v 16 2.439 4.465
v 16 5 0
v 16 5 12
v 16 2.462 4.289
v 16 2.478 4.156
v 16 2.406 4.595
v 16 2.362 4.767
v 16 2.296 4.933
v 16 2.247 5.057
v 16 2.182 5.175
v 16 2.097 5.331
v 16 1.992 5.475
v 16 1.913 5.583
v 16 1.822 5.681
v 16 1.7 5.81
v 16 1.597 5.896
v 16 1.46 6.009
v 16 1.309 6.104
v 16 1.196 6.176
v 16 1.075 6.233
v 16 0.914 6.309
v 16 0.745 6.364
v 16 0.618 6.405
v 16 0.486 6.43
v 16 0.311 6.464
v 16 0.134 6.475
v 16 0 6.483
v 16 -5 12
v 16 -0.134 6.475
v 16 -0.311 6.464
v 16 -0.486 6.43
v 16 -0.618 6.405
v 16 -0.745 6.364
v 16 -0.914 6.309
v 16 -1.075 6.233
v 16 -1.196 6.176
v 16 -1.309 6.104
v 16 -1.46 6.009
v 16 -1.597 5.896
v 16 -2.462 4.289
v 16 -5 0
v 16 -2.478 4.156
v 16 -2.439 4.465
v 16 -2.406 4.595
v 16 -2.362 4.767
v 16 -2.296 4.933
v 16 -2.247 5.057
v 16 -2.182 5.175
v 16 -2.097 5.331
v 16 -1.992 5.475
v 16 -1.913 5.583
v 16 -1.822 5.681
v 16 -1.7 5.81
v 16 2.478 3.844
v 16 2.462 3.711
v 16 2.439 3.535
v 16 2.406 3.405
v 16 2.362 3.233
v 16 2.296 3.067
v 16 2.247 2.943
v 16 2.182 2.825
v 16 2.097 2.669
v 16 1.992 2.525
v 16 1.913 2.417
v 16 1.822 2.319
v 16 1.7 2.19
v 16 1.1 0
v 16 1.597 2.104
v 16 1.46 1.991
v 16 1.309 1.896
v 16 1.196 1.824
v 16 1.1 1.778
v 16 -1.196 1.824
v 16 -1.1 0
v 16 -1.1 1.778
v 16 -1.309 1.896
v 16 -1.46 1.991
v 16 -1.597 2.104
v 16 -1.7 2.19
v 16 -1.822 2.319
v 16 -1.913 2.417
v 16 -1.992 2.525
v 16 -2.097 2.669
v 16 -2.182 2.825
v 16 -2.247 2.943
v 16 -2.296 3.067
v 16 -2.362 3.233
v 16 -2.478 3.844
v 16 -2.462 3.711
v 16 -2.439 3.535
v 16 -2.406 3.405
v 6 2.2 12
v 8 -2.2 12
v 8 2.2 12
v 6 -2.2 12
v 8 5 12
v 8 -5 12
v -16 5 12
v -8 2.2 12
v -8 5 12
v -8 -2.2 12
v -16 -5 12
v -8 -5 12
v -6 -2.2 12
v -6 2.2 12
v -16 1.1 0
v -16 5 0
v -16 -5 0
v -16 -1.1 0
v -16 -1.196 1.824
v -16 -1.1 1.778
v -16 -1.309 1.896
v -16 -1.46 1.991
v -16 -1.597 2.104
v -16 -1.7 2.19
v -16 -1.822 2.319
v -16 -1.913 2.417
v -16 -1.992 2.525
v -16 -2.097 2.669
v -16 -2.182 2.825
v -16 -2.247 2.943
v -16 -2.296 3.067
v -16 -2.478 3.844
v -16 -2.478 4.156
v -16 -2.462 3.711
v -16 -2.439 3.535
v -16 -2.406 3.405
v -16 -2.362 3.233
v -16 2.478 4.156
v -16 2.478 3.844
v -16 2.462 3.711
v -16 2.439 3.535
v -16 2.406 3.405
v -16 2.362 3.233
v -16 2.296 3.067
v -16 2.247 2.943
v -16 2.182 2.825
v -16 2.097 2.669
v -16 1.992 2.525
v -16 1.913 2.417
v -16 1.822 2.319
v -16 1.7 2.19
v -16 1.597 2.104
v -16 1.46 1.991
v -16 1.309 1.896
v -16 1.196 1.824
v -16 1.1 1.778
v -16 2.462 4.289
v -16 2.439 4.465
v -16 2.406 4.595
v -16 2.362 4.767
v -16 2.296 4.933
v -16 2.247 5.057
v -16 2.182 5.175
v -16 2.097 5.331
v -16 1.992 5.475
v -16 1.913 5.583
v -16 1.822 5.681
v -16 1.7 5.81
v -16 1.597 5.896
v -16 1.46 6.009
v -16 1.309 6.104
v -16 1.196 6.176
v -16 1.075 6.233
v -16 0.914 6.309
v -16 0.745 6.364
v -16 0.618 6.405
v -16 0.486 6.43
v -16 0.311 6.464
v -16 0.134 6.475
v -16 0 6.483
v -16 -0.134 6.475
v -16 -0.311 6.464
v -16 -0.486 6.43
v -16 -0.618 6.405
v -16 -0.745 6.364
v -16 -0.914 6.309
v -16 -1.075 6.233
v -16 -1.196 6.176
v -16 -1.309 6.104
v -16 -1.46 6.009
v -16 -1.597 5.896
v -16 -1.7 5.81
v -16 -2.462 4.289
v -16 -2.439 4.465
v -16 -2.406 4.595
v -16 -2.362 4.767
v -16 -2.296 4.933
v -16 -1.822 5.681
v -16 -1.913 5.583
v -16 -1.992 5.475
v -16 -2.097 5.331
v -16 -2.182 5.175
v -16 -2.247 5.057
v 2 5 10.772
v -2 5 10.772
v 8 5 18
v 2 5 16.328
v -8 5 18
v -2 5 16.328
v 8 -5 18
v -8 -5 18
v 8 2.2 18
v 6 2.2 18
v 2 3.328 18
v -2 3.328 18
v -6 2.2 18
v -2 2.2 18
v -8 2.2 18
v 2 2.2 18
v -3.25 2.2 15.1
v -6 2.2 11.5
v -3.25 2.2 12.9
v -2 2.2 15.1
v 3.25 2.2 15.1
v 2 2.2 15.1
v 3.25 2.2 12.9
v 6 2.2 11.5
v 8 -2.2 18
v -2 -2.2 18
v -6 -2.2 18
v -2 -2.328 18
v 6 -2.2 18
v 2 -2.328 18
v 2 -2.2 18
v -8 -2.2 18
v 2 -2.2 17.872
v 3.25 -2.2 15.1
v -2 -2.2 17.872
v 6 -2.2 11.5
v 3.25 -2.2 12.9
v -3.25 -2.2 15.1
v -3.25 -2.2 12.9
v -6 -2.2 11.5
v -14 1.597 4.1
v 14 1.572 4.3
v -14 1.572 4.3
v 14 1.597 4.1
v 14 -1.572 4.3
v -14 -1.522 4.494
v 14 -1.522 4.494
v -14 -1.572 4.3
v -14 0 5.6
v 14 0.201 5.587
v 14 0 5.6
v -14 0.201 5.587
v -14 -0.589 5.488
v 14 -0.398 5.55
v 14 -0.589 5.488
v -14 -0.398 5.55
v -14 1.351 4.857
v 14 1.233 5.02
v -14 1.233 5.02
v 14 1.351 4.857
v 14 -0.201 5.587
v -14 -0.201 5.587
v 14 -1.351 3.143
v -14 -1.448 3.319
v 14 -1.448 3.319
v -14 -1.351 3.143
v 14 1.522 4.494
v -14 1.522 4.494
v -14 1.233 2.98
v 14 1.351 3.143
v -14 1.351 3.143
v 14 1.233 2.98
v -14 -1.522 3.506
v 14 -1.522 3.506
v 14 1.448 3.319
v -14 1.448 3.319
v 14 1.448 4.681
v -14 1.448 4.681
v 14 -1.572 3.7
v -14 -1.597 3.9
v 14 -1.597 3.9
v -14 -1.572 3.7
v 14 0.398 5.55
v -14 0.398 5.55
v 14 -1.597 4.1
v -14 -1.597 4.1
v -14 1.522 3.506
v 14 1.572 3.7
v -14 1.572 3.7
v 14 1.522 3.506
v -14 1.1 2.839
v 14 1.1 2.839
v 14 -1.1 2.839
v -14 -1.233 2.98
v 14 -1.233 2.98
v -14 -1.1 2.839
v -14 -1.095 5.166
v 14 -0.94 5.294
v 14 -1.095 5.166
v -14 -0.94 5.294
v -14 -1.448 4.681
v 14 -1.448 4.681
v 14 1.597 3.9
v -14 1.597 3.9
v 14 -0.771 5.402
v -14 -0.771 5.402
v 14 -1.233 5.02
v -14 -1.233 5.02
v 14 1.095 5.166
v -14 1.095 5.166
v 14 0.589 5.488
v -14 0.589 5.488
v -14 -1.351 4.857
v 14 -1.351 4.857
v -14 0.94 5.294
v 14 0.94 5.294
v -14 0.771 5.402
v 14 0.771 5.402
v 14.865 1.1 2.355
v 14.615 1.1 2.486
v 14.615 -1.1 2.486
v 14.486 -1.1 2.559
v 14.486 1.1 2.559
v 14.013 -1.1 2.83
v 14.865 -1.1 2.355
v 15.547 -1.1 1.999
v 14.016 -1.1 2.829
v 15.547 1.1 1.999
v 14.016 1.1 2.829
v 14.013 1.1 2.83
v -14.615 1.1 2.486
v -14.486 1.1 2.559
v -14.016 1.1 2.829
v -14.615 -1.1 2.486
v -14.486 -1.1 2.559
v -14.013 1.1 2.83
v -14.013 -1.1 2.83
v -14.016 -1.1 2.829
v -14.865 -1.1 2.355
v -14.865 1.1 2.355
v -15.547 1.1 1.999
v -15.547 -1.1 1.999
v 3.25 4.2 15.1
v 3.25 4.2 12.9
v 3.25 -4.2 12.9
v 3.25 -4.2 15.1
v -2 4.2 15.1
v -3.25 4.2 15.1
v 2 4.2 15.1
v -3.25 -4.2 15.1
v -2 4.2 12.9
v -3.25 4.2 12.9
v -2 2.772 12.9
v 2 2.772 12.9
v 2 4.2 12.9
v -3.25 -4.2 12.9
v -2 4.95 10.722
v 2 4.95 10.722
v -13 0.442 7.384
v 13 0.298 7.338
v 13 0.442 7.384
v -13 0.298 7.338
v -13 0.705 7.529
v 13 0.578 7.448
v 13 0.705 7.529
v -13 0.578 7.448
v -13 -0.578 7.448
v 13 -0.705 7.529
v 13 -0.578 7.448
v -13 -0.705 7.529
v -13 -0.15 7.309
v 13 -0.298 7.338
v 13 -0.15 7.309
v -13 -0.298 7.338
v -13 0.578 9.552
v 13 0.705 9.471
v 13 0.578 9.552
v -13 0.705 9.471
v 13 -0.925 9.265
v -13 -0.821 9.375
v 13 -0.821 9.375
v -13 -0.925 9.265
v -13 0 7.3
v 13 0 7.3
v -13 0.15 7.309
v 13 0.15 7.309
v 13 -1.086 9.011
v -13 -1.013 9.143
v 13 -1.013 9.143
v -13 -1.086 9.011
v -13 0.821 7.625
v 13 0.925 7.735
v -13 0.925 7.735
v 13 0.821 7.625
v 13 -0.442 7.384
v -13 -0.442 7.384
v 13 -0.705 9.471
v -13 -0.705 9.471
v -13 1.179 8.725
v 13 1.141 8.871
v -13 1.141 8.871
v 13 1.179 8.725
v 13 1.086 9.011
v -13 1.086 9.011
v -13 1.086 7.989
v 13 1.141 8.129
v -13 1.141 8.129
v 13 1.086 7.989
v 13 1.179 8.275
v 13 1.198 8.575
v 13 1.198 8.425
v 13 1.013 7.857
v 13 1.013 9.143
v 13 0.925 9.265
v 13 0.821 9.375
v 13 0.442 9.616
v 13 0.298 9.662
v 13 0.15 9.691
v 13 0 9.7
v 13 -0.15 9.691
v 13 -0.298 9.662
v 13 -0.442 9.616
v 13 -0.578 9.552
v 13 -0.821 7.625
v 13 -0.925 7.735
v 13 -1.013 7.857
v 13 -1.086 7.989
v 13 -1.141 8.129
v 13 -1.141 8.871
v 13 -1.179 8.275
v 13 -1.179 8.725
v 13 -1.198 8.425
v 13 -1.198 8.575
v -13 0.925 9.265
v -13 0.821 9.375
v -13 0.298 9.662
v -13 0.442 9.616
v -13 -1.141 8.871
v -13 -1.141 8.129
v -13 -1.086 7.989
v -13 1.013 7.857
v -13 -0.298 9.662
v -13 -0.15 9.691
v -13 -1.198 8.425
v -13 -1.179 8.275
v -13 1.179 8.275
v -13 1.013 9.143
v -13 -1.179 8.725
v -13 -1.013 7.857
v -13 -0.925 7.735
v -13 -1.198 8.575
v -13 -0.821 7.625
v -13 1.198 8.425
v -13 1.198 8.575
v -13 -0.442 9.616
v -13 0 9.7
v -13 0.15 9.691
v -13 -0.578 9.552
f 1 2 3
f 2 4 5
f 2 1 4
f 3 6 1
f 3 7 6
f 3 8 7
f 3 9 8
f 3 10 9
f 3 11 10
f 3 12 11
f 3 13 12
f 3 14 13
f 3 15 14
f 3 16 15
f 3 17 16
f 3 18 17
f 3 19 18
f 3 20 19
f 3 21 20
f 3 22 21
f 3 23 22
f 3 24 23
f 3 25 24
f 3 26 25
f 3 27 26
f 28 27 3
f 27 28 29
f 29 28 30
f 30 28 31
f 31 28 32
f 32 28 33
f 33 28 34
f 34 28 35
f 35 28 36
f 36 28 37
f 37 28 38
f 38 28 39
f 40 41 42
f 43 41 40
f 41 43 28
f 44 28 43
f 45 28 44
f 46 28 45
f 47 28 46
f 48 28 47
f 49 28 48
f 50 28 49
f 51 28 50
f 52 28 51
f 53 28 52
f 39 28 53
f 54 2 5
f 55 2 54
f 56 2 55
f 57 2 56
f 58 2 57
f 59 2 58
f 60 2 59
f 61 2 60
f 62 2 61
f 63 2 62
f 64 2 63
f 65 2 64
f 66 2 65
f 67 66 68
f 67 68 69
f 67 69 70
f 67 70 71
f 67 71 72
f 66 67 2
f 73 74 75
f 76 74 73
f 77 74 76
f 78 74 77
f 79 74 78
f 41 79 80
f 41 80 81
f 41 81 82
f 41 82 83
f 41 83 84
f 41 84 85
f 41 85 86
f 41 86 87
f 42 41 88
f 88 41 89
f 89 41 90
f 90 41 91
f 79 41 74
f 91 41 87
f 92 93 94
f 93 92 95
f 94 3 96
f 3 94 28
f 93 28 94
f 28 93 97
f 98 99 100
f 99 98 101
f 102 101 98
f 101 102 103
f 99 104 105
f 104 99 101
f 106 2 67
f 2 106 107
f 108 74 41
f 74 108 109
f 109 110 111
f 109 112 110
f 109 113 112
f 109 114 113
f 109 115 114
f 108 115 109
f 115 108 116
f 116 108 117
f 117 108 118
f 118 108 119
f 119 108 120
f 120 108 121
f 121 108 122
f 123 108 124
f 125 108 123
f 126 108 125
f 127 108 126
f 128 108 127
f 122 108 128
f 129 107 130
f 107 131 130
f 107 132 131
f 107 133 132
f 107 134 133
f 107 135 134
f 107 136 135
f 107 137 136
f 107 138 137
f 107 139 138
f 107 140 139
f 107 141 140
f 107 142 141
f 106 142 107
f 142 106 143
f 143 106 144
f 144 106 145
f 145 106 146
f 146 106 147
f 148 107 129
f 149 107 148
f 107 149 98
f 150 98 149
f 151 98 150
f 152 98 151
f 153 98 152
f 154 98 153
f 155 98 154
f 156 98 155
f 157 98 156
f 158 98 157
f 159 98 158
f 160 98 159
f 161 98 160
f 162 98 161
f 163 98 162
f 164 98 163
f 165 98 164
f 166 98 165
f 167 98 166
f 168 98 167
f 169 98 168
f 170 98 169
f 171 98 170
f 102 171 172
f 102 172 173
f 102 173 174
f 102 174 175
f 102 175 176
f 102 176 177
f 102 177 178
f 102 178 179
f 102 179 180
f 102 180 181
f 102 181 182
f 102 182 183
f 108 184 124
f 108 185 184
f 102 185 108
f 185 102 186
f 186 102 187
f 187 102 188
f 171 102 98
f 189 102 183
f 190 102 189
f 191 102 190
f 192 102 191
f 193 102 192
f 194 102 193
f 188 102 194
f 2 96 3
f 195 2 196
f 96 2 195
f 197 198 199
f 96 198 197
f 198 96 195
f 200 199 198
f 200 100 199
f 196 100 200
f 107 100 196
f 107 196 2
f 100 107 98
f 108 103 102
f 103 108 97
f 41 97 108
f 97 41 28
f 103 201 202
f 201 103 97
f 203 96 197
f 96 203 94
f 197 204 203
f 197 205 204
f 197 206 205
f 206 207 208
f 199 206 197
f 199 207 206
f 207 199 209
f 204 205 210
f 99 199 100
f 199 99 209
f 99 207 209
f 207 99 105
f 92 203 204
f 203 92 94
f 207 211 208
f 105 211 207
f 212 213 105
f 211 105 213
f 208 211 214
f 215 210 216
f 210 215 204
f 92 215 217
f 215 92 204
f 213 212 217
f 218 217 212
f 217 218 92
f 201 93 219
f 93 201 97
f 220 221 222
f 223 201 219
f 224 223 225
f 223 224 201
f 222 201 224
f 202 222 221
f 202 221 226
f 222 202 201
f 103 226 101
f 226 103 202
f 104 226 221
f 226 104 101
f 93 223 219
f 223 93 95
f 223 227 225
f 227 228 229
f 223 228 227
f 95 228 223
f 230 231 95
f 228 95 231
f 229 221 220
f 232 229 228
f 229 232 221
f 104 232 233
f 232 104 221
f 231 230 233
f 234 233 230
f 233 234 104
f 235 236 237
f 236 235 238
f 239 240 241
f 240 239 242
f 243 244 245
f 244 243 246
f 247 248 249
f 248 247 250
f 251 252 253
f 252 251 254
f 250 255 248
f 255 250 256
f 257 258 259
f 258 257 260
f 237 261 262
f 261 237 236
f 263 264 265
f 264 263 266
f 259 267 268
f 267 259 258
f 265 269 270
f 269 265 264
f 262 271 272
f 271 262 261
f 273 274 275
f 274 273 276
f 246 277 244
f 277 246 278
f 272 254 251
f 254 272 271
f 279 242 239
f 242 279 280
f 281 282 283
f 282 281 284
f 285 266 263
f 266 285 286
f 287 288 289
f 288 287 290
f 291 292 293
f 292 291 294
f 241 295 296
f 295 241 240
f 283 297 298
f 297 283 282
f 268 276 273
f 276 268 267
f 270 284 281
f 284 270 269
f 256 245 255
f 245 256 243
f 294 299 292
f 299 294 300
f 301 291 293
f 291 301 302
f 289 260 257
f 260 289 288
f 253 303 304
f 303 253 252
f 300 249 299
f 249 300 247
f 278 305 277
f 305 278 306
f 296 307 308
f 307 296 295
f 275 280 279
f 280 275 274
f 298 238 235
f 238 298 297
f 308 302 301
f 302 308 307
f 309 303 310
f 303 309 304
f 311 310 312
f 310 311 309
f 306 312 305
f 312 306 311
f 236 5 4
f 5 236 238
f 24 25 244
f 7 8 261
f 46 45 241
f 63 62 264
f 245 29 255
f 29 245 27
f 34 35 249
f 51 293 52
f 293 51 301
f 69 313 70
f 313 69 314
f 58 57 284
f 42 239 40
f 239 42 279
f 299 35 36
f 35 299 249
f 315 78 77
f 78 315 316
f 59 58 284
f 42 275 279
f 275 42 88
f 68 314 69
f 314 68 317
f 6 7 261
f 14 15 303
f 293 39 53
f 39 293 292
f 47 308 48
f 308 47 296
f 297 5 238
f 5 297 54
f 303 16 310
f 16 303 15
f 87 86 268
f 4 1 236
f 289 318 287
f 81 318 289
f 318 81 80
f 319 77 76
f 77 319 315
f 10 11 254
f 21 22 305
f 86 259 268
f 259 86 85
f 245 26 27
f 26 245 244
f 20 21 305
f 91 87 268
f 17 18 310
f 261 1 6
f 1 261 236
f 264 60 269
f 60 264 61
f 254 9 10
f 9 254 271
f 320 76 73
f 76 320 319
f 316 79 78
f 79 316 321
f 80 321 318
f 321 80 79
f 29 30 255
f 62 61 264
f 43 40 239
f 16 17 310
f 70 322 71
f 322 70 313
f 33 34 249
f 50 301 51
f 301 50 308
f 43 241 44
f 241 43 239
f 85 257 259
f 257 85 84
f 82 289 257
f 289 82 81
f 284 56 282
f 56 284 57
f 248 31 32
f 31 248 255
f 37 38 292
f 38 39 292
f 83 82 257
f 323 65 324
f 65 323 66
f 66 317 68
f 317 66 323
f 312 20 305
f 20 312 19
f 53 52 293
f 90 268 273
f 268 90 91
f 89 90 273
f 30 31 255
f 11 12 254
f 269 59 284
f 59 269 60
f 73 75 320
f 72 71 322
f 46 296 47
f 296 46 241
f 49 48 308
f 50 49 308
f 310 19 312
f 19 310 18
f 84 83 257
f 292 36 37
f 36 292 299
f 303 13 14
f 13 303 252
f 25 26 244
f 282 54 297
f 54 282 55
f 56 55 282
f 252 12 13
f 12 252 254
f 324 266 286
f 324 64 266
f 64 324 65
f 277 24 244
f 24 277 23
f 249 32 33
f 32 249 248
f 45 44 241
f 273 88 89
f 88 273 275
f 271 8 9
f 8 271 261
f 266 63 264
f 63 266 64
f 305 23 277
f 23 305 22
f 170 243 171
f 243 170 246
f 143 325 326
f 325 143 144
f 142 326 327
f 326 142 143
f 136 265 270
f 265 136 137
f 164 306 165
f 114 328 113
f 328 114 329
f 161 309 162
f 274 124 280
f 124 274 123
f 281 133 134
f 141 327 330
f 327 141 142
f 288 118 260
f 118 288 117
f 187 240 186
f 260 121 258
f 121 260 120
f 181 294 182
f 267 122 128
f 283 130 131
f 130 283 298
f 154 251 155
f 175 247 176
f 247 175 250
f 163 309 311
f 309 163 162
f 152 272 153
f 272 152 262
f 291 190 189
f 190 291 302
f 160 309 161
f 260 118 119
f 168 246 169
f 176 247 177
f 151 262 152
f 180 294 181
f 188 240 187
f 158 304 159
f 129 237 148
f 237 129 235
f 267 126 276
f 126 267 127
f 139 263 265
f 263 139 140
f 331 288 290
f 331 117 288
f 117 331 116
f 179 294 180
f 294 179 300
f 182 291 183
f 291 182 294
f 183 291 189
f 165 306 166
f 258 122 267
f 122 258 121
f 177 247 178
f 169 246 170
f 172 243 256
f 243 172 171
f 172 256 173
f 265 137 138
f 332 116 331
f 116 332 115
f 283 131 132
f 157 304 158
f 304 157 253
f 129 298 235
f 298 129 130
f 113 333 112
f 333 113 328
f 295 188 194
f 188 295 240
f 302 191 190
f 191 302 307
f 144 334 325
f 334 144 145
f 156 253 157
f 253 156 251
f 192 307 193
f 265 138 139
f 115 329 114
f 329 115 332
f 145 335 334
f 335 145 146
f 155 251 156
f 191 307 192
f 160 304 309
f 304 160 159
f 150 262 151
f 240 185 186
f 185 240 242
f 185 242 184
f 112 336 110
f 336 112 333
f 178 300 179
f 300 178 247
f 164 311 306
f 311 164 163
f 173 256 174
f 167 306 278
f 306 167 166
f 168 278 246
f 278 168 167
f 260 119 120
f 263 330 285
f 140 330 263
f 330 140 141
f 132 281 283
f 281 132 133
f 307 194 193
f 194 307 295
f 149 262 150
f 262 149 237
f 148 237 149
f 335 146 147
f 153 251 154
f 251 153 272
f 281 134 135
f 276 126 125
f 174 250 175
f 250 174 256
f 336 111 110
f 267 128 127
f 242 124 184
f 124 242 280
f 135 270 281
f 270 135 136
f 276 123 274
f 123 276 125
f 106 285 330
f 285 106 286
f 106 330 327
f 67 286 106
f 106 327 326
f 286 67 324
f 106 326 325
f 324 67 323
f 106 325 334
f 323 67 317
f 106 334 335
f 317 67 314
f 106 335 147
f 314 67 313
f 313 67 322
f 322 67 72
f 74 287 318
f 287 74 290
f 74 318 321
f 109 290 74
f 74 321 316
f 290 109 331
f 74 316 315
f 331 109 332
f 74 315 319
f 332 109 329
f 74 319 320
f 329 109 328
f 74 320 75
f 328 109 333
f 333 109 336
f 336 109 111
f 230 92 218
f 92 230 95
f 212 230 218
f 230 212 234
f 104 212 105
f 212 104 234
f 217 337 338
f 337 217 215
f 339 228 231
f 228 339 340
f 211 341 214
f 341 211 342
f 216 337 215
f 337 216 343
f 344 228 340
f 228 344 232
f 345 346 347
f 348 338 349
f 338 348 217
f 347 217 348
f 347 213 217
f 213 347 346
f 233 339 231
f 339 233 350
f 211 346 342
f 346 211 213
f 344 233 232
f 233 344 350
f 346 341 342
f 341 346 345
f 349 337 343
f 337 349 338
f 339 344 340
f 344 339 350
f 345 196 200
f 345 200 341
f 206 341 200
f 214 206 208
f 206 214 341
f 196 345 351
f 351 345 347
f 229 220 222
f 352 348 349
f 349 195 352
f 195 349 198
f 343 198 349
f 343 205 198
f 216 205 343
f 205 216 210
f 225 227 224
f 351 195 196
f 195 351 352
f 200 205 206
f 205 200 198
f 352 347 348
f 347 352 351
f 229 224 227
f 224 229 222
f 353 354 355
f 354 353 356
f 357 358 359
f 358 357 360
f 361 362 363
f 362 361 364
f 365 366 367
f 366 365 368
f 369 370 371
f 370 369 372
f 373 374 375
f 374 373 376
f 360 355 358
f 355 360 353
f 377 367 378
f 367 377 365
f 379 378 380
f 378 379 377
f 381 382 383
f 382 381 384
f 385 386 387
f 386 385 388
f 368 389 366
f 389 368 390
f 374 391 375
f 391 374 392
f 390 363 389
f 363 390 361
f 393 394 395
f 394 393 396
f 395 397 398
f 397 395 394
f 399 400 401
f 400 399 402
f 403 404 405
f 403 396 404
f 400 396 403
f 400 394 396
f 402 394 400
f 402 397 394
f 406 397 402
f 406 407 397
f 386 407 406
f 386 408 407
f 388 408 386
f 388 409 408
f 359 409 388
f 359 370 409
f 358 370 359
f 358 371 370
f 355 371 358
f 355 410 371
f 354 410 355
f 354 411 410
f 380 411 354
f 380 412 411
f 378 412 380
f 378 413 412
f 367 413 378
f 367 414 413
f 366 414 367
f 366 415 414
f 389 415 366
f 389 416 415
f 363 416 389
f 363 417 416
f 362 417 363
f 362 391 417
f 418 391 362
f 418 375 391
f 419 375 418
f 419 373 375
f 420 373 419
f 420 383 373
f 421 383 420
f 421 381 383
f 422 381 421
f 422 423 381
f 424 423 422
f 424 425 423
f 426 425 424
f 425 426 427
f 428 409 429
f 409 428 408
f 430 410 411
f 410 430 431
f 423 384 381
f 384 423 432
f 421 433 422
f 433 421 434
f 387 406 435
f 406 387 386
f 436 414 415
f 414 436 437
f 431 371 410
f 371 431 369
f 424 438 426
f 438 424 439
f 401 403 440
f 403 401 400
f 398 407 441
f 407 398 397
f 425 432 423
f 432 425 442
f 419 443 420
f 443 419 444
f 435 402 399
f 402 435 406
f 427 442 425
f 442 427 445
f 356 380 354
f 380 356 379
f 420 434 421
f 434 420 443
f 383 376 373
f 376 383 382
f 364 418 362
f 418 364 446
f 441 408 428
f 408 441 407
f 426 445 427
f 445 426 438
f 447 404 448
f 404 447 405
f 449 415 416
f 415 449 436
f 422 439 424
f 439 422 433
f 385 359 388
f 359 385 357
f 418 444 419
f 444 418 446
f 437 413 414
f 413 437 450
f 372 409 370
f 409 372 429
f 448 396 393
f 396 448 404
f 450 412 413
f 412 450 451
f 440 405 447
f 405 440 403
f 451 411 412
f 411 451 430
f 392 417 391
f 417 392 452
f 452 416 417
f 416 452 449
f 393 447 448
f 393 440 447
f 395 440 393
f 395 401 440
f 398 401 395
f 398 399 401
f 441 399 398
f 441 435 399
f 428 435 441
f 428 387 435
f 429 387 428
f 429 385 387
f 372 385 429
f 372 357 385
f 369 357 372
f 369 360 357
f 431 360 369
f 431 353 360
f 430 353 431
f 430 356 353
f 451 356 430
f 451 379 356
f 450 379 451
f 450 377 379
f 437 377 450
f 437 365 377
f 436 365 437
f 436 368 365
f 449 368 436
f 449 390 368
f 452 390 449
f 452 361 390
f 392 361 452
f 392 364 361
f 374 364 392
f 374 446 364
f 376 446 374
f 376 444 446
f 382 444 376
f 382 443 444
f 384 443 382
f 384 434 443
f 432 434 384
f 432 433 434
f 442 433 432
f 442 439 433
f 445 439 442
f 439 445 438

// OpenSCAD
// ====================================================================
// Alpine Cable Glider Sled Runner (Option A: Barb-Lock Snap Socket)
// 
// Features:
// - Top Glider Channel: Smooth 45-degree trumpet funnels glide snag-free on cable line.
// - Bottom Barb-Lock Socket: Internal locking shoulders receive the 
//   wedge arrow-head barb of C-Hanger Arm (03).
// - ZERO TINY PEGS! ZERO LOOSE PINS! ZERO SCREWS!
// ====================================================================

$fn = 50;

chassis_l    = 32.0; // Overall glider length (mm)
chassis_w    = 10.0; // Overall glider width (mm)
chassis_h    = 12.0; // Chassis height (mm)
cable_bore_d = 3.2;  // Inner smooth cable channel diameter
clevis_gap   = 4.4;  // Fits 4.0mm hanger arm tab
clevis_ear_h = 6.0;  // Lower clevis ear height


module trolley_carriage_glider_print() {
    difference() {
        union() {
            // Main chassis block (flat on bed at Z = 0)
            translate([0, 0, chassis_h / 2])
                cube([chassis_l, chassis_w, chassis_h], center = true);
            
            // Lower hanger clevis ears
            translate([0, (clevis_gap + (chassis_w - clevis_gap)/2) / 2, chassis_h + clevis_ear_h / 2])
                cube([16.0, (chassis_w - clevis_gap)/2, clevis_ear_h], center = true);
            translate([0, -(clevis_gap + (chassis_w - clevis_gap)/2) / 2, chassis_h + clevis_ear_h / 2])
                cube([16.0, (chassis_w - clevis_gap)/2, clevis_ear_h], center = true);
        }

        // 1. Longitudinal smooth cable tunnel bore
        translate([0, 0, 4.0])
            rotate([0, 90, 0])
                cylinder(d = cable_bore_d, h = chassis_l + 4, center = true);

        // 2. Flared trumpet entry funnels at both ends (+X and -X)
        translate([chassis_l / 2 - 2, 0, 4.0])
            rotate([0, 90, 0])
                cylinder(d1 = cable_bore_d, d2 = 8.5, h = 6.0);
        translate([-chassis_l / 2 + 2, 0, 4.0])
            rotate([0, -90, 0])
                cylinder(d1 = cable_bore_d, d2 = 8.5, h = 6.0);

        // 3. Top snap-entry slot (2.2mm top opening)
        translate([0, 0, 2.0])
            cube([chassis_l + 4, 2.2, 5.0], center = true);

        // --- INTERNAL BARB-LOCK SHOULDERS (RECEIVES HANGER ARM BARB) ---
        // 4. Central receiving slot for 4.0mm C-Hanger Arm top tab
        translate([0, 0, chassis_h + clevis_ear_h / 2 + 0.5])
            cube([12.0, clevis_gap, clevis_ear_h + 2], center = true);

        // 5. Internal Barb-Lock Shoulders (6.5mm width inside slot)
        translate([0, 0, chassis_h + 2.0])
            cube([6.5, clevis_gap + 4.0, 2.2], center = true);

        // 6. 45-degree self-guiding lead-in chamfer mouth at entry
        translate([0, 0, chassis_h + clevis_ear_h + 0.5])
            rotate([45, 0, 0])
                cube([4.0, 4.0, 18.0], center = true);

        // Optional haul-line tie-off slots (for motorized pull string)
        translate([6, 0, 8.5])
            rotate([0, 90, 0])
                cylinder(d = 2.4, h = chassis_w + 4, center = true);
        translate([-6, 0, 8.5])
            rotate([0, 90, 0])
                cylinder(d = 2.4, h = chassis_w + 4, center = true);
    }
}

module trolley_carriage() {
    translate([0, 0, 9.0])
        rotate([180, 0, 0])
            trolley_carriage_glider_print();
}

// Render flat on bed at Z = 0
trolley_carriage_glider_print();
